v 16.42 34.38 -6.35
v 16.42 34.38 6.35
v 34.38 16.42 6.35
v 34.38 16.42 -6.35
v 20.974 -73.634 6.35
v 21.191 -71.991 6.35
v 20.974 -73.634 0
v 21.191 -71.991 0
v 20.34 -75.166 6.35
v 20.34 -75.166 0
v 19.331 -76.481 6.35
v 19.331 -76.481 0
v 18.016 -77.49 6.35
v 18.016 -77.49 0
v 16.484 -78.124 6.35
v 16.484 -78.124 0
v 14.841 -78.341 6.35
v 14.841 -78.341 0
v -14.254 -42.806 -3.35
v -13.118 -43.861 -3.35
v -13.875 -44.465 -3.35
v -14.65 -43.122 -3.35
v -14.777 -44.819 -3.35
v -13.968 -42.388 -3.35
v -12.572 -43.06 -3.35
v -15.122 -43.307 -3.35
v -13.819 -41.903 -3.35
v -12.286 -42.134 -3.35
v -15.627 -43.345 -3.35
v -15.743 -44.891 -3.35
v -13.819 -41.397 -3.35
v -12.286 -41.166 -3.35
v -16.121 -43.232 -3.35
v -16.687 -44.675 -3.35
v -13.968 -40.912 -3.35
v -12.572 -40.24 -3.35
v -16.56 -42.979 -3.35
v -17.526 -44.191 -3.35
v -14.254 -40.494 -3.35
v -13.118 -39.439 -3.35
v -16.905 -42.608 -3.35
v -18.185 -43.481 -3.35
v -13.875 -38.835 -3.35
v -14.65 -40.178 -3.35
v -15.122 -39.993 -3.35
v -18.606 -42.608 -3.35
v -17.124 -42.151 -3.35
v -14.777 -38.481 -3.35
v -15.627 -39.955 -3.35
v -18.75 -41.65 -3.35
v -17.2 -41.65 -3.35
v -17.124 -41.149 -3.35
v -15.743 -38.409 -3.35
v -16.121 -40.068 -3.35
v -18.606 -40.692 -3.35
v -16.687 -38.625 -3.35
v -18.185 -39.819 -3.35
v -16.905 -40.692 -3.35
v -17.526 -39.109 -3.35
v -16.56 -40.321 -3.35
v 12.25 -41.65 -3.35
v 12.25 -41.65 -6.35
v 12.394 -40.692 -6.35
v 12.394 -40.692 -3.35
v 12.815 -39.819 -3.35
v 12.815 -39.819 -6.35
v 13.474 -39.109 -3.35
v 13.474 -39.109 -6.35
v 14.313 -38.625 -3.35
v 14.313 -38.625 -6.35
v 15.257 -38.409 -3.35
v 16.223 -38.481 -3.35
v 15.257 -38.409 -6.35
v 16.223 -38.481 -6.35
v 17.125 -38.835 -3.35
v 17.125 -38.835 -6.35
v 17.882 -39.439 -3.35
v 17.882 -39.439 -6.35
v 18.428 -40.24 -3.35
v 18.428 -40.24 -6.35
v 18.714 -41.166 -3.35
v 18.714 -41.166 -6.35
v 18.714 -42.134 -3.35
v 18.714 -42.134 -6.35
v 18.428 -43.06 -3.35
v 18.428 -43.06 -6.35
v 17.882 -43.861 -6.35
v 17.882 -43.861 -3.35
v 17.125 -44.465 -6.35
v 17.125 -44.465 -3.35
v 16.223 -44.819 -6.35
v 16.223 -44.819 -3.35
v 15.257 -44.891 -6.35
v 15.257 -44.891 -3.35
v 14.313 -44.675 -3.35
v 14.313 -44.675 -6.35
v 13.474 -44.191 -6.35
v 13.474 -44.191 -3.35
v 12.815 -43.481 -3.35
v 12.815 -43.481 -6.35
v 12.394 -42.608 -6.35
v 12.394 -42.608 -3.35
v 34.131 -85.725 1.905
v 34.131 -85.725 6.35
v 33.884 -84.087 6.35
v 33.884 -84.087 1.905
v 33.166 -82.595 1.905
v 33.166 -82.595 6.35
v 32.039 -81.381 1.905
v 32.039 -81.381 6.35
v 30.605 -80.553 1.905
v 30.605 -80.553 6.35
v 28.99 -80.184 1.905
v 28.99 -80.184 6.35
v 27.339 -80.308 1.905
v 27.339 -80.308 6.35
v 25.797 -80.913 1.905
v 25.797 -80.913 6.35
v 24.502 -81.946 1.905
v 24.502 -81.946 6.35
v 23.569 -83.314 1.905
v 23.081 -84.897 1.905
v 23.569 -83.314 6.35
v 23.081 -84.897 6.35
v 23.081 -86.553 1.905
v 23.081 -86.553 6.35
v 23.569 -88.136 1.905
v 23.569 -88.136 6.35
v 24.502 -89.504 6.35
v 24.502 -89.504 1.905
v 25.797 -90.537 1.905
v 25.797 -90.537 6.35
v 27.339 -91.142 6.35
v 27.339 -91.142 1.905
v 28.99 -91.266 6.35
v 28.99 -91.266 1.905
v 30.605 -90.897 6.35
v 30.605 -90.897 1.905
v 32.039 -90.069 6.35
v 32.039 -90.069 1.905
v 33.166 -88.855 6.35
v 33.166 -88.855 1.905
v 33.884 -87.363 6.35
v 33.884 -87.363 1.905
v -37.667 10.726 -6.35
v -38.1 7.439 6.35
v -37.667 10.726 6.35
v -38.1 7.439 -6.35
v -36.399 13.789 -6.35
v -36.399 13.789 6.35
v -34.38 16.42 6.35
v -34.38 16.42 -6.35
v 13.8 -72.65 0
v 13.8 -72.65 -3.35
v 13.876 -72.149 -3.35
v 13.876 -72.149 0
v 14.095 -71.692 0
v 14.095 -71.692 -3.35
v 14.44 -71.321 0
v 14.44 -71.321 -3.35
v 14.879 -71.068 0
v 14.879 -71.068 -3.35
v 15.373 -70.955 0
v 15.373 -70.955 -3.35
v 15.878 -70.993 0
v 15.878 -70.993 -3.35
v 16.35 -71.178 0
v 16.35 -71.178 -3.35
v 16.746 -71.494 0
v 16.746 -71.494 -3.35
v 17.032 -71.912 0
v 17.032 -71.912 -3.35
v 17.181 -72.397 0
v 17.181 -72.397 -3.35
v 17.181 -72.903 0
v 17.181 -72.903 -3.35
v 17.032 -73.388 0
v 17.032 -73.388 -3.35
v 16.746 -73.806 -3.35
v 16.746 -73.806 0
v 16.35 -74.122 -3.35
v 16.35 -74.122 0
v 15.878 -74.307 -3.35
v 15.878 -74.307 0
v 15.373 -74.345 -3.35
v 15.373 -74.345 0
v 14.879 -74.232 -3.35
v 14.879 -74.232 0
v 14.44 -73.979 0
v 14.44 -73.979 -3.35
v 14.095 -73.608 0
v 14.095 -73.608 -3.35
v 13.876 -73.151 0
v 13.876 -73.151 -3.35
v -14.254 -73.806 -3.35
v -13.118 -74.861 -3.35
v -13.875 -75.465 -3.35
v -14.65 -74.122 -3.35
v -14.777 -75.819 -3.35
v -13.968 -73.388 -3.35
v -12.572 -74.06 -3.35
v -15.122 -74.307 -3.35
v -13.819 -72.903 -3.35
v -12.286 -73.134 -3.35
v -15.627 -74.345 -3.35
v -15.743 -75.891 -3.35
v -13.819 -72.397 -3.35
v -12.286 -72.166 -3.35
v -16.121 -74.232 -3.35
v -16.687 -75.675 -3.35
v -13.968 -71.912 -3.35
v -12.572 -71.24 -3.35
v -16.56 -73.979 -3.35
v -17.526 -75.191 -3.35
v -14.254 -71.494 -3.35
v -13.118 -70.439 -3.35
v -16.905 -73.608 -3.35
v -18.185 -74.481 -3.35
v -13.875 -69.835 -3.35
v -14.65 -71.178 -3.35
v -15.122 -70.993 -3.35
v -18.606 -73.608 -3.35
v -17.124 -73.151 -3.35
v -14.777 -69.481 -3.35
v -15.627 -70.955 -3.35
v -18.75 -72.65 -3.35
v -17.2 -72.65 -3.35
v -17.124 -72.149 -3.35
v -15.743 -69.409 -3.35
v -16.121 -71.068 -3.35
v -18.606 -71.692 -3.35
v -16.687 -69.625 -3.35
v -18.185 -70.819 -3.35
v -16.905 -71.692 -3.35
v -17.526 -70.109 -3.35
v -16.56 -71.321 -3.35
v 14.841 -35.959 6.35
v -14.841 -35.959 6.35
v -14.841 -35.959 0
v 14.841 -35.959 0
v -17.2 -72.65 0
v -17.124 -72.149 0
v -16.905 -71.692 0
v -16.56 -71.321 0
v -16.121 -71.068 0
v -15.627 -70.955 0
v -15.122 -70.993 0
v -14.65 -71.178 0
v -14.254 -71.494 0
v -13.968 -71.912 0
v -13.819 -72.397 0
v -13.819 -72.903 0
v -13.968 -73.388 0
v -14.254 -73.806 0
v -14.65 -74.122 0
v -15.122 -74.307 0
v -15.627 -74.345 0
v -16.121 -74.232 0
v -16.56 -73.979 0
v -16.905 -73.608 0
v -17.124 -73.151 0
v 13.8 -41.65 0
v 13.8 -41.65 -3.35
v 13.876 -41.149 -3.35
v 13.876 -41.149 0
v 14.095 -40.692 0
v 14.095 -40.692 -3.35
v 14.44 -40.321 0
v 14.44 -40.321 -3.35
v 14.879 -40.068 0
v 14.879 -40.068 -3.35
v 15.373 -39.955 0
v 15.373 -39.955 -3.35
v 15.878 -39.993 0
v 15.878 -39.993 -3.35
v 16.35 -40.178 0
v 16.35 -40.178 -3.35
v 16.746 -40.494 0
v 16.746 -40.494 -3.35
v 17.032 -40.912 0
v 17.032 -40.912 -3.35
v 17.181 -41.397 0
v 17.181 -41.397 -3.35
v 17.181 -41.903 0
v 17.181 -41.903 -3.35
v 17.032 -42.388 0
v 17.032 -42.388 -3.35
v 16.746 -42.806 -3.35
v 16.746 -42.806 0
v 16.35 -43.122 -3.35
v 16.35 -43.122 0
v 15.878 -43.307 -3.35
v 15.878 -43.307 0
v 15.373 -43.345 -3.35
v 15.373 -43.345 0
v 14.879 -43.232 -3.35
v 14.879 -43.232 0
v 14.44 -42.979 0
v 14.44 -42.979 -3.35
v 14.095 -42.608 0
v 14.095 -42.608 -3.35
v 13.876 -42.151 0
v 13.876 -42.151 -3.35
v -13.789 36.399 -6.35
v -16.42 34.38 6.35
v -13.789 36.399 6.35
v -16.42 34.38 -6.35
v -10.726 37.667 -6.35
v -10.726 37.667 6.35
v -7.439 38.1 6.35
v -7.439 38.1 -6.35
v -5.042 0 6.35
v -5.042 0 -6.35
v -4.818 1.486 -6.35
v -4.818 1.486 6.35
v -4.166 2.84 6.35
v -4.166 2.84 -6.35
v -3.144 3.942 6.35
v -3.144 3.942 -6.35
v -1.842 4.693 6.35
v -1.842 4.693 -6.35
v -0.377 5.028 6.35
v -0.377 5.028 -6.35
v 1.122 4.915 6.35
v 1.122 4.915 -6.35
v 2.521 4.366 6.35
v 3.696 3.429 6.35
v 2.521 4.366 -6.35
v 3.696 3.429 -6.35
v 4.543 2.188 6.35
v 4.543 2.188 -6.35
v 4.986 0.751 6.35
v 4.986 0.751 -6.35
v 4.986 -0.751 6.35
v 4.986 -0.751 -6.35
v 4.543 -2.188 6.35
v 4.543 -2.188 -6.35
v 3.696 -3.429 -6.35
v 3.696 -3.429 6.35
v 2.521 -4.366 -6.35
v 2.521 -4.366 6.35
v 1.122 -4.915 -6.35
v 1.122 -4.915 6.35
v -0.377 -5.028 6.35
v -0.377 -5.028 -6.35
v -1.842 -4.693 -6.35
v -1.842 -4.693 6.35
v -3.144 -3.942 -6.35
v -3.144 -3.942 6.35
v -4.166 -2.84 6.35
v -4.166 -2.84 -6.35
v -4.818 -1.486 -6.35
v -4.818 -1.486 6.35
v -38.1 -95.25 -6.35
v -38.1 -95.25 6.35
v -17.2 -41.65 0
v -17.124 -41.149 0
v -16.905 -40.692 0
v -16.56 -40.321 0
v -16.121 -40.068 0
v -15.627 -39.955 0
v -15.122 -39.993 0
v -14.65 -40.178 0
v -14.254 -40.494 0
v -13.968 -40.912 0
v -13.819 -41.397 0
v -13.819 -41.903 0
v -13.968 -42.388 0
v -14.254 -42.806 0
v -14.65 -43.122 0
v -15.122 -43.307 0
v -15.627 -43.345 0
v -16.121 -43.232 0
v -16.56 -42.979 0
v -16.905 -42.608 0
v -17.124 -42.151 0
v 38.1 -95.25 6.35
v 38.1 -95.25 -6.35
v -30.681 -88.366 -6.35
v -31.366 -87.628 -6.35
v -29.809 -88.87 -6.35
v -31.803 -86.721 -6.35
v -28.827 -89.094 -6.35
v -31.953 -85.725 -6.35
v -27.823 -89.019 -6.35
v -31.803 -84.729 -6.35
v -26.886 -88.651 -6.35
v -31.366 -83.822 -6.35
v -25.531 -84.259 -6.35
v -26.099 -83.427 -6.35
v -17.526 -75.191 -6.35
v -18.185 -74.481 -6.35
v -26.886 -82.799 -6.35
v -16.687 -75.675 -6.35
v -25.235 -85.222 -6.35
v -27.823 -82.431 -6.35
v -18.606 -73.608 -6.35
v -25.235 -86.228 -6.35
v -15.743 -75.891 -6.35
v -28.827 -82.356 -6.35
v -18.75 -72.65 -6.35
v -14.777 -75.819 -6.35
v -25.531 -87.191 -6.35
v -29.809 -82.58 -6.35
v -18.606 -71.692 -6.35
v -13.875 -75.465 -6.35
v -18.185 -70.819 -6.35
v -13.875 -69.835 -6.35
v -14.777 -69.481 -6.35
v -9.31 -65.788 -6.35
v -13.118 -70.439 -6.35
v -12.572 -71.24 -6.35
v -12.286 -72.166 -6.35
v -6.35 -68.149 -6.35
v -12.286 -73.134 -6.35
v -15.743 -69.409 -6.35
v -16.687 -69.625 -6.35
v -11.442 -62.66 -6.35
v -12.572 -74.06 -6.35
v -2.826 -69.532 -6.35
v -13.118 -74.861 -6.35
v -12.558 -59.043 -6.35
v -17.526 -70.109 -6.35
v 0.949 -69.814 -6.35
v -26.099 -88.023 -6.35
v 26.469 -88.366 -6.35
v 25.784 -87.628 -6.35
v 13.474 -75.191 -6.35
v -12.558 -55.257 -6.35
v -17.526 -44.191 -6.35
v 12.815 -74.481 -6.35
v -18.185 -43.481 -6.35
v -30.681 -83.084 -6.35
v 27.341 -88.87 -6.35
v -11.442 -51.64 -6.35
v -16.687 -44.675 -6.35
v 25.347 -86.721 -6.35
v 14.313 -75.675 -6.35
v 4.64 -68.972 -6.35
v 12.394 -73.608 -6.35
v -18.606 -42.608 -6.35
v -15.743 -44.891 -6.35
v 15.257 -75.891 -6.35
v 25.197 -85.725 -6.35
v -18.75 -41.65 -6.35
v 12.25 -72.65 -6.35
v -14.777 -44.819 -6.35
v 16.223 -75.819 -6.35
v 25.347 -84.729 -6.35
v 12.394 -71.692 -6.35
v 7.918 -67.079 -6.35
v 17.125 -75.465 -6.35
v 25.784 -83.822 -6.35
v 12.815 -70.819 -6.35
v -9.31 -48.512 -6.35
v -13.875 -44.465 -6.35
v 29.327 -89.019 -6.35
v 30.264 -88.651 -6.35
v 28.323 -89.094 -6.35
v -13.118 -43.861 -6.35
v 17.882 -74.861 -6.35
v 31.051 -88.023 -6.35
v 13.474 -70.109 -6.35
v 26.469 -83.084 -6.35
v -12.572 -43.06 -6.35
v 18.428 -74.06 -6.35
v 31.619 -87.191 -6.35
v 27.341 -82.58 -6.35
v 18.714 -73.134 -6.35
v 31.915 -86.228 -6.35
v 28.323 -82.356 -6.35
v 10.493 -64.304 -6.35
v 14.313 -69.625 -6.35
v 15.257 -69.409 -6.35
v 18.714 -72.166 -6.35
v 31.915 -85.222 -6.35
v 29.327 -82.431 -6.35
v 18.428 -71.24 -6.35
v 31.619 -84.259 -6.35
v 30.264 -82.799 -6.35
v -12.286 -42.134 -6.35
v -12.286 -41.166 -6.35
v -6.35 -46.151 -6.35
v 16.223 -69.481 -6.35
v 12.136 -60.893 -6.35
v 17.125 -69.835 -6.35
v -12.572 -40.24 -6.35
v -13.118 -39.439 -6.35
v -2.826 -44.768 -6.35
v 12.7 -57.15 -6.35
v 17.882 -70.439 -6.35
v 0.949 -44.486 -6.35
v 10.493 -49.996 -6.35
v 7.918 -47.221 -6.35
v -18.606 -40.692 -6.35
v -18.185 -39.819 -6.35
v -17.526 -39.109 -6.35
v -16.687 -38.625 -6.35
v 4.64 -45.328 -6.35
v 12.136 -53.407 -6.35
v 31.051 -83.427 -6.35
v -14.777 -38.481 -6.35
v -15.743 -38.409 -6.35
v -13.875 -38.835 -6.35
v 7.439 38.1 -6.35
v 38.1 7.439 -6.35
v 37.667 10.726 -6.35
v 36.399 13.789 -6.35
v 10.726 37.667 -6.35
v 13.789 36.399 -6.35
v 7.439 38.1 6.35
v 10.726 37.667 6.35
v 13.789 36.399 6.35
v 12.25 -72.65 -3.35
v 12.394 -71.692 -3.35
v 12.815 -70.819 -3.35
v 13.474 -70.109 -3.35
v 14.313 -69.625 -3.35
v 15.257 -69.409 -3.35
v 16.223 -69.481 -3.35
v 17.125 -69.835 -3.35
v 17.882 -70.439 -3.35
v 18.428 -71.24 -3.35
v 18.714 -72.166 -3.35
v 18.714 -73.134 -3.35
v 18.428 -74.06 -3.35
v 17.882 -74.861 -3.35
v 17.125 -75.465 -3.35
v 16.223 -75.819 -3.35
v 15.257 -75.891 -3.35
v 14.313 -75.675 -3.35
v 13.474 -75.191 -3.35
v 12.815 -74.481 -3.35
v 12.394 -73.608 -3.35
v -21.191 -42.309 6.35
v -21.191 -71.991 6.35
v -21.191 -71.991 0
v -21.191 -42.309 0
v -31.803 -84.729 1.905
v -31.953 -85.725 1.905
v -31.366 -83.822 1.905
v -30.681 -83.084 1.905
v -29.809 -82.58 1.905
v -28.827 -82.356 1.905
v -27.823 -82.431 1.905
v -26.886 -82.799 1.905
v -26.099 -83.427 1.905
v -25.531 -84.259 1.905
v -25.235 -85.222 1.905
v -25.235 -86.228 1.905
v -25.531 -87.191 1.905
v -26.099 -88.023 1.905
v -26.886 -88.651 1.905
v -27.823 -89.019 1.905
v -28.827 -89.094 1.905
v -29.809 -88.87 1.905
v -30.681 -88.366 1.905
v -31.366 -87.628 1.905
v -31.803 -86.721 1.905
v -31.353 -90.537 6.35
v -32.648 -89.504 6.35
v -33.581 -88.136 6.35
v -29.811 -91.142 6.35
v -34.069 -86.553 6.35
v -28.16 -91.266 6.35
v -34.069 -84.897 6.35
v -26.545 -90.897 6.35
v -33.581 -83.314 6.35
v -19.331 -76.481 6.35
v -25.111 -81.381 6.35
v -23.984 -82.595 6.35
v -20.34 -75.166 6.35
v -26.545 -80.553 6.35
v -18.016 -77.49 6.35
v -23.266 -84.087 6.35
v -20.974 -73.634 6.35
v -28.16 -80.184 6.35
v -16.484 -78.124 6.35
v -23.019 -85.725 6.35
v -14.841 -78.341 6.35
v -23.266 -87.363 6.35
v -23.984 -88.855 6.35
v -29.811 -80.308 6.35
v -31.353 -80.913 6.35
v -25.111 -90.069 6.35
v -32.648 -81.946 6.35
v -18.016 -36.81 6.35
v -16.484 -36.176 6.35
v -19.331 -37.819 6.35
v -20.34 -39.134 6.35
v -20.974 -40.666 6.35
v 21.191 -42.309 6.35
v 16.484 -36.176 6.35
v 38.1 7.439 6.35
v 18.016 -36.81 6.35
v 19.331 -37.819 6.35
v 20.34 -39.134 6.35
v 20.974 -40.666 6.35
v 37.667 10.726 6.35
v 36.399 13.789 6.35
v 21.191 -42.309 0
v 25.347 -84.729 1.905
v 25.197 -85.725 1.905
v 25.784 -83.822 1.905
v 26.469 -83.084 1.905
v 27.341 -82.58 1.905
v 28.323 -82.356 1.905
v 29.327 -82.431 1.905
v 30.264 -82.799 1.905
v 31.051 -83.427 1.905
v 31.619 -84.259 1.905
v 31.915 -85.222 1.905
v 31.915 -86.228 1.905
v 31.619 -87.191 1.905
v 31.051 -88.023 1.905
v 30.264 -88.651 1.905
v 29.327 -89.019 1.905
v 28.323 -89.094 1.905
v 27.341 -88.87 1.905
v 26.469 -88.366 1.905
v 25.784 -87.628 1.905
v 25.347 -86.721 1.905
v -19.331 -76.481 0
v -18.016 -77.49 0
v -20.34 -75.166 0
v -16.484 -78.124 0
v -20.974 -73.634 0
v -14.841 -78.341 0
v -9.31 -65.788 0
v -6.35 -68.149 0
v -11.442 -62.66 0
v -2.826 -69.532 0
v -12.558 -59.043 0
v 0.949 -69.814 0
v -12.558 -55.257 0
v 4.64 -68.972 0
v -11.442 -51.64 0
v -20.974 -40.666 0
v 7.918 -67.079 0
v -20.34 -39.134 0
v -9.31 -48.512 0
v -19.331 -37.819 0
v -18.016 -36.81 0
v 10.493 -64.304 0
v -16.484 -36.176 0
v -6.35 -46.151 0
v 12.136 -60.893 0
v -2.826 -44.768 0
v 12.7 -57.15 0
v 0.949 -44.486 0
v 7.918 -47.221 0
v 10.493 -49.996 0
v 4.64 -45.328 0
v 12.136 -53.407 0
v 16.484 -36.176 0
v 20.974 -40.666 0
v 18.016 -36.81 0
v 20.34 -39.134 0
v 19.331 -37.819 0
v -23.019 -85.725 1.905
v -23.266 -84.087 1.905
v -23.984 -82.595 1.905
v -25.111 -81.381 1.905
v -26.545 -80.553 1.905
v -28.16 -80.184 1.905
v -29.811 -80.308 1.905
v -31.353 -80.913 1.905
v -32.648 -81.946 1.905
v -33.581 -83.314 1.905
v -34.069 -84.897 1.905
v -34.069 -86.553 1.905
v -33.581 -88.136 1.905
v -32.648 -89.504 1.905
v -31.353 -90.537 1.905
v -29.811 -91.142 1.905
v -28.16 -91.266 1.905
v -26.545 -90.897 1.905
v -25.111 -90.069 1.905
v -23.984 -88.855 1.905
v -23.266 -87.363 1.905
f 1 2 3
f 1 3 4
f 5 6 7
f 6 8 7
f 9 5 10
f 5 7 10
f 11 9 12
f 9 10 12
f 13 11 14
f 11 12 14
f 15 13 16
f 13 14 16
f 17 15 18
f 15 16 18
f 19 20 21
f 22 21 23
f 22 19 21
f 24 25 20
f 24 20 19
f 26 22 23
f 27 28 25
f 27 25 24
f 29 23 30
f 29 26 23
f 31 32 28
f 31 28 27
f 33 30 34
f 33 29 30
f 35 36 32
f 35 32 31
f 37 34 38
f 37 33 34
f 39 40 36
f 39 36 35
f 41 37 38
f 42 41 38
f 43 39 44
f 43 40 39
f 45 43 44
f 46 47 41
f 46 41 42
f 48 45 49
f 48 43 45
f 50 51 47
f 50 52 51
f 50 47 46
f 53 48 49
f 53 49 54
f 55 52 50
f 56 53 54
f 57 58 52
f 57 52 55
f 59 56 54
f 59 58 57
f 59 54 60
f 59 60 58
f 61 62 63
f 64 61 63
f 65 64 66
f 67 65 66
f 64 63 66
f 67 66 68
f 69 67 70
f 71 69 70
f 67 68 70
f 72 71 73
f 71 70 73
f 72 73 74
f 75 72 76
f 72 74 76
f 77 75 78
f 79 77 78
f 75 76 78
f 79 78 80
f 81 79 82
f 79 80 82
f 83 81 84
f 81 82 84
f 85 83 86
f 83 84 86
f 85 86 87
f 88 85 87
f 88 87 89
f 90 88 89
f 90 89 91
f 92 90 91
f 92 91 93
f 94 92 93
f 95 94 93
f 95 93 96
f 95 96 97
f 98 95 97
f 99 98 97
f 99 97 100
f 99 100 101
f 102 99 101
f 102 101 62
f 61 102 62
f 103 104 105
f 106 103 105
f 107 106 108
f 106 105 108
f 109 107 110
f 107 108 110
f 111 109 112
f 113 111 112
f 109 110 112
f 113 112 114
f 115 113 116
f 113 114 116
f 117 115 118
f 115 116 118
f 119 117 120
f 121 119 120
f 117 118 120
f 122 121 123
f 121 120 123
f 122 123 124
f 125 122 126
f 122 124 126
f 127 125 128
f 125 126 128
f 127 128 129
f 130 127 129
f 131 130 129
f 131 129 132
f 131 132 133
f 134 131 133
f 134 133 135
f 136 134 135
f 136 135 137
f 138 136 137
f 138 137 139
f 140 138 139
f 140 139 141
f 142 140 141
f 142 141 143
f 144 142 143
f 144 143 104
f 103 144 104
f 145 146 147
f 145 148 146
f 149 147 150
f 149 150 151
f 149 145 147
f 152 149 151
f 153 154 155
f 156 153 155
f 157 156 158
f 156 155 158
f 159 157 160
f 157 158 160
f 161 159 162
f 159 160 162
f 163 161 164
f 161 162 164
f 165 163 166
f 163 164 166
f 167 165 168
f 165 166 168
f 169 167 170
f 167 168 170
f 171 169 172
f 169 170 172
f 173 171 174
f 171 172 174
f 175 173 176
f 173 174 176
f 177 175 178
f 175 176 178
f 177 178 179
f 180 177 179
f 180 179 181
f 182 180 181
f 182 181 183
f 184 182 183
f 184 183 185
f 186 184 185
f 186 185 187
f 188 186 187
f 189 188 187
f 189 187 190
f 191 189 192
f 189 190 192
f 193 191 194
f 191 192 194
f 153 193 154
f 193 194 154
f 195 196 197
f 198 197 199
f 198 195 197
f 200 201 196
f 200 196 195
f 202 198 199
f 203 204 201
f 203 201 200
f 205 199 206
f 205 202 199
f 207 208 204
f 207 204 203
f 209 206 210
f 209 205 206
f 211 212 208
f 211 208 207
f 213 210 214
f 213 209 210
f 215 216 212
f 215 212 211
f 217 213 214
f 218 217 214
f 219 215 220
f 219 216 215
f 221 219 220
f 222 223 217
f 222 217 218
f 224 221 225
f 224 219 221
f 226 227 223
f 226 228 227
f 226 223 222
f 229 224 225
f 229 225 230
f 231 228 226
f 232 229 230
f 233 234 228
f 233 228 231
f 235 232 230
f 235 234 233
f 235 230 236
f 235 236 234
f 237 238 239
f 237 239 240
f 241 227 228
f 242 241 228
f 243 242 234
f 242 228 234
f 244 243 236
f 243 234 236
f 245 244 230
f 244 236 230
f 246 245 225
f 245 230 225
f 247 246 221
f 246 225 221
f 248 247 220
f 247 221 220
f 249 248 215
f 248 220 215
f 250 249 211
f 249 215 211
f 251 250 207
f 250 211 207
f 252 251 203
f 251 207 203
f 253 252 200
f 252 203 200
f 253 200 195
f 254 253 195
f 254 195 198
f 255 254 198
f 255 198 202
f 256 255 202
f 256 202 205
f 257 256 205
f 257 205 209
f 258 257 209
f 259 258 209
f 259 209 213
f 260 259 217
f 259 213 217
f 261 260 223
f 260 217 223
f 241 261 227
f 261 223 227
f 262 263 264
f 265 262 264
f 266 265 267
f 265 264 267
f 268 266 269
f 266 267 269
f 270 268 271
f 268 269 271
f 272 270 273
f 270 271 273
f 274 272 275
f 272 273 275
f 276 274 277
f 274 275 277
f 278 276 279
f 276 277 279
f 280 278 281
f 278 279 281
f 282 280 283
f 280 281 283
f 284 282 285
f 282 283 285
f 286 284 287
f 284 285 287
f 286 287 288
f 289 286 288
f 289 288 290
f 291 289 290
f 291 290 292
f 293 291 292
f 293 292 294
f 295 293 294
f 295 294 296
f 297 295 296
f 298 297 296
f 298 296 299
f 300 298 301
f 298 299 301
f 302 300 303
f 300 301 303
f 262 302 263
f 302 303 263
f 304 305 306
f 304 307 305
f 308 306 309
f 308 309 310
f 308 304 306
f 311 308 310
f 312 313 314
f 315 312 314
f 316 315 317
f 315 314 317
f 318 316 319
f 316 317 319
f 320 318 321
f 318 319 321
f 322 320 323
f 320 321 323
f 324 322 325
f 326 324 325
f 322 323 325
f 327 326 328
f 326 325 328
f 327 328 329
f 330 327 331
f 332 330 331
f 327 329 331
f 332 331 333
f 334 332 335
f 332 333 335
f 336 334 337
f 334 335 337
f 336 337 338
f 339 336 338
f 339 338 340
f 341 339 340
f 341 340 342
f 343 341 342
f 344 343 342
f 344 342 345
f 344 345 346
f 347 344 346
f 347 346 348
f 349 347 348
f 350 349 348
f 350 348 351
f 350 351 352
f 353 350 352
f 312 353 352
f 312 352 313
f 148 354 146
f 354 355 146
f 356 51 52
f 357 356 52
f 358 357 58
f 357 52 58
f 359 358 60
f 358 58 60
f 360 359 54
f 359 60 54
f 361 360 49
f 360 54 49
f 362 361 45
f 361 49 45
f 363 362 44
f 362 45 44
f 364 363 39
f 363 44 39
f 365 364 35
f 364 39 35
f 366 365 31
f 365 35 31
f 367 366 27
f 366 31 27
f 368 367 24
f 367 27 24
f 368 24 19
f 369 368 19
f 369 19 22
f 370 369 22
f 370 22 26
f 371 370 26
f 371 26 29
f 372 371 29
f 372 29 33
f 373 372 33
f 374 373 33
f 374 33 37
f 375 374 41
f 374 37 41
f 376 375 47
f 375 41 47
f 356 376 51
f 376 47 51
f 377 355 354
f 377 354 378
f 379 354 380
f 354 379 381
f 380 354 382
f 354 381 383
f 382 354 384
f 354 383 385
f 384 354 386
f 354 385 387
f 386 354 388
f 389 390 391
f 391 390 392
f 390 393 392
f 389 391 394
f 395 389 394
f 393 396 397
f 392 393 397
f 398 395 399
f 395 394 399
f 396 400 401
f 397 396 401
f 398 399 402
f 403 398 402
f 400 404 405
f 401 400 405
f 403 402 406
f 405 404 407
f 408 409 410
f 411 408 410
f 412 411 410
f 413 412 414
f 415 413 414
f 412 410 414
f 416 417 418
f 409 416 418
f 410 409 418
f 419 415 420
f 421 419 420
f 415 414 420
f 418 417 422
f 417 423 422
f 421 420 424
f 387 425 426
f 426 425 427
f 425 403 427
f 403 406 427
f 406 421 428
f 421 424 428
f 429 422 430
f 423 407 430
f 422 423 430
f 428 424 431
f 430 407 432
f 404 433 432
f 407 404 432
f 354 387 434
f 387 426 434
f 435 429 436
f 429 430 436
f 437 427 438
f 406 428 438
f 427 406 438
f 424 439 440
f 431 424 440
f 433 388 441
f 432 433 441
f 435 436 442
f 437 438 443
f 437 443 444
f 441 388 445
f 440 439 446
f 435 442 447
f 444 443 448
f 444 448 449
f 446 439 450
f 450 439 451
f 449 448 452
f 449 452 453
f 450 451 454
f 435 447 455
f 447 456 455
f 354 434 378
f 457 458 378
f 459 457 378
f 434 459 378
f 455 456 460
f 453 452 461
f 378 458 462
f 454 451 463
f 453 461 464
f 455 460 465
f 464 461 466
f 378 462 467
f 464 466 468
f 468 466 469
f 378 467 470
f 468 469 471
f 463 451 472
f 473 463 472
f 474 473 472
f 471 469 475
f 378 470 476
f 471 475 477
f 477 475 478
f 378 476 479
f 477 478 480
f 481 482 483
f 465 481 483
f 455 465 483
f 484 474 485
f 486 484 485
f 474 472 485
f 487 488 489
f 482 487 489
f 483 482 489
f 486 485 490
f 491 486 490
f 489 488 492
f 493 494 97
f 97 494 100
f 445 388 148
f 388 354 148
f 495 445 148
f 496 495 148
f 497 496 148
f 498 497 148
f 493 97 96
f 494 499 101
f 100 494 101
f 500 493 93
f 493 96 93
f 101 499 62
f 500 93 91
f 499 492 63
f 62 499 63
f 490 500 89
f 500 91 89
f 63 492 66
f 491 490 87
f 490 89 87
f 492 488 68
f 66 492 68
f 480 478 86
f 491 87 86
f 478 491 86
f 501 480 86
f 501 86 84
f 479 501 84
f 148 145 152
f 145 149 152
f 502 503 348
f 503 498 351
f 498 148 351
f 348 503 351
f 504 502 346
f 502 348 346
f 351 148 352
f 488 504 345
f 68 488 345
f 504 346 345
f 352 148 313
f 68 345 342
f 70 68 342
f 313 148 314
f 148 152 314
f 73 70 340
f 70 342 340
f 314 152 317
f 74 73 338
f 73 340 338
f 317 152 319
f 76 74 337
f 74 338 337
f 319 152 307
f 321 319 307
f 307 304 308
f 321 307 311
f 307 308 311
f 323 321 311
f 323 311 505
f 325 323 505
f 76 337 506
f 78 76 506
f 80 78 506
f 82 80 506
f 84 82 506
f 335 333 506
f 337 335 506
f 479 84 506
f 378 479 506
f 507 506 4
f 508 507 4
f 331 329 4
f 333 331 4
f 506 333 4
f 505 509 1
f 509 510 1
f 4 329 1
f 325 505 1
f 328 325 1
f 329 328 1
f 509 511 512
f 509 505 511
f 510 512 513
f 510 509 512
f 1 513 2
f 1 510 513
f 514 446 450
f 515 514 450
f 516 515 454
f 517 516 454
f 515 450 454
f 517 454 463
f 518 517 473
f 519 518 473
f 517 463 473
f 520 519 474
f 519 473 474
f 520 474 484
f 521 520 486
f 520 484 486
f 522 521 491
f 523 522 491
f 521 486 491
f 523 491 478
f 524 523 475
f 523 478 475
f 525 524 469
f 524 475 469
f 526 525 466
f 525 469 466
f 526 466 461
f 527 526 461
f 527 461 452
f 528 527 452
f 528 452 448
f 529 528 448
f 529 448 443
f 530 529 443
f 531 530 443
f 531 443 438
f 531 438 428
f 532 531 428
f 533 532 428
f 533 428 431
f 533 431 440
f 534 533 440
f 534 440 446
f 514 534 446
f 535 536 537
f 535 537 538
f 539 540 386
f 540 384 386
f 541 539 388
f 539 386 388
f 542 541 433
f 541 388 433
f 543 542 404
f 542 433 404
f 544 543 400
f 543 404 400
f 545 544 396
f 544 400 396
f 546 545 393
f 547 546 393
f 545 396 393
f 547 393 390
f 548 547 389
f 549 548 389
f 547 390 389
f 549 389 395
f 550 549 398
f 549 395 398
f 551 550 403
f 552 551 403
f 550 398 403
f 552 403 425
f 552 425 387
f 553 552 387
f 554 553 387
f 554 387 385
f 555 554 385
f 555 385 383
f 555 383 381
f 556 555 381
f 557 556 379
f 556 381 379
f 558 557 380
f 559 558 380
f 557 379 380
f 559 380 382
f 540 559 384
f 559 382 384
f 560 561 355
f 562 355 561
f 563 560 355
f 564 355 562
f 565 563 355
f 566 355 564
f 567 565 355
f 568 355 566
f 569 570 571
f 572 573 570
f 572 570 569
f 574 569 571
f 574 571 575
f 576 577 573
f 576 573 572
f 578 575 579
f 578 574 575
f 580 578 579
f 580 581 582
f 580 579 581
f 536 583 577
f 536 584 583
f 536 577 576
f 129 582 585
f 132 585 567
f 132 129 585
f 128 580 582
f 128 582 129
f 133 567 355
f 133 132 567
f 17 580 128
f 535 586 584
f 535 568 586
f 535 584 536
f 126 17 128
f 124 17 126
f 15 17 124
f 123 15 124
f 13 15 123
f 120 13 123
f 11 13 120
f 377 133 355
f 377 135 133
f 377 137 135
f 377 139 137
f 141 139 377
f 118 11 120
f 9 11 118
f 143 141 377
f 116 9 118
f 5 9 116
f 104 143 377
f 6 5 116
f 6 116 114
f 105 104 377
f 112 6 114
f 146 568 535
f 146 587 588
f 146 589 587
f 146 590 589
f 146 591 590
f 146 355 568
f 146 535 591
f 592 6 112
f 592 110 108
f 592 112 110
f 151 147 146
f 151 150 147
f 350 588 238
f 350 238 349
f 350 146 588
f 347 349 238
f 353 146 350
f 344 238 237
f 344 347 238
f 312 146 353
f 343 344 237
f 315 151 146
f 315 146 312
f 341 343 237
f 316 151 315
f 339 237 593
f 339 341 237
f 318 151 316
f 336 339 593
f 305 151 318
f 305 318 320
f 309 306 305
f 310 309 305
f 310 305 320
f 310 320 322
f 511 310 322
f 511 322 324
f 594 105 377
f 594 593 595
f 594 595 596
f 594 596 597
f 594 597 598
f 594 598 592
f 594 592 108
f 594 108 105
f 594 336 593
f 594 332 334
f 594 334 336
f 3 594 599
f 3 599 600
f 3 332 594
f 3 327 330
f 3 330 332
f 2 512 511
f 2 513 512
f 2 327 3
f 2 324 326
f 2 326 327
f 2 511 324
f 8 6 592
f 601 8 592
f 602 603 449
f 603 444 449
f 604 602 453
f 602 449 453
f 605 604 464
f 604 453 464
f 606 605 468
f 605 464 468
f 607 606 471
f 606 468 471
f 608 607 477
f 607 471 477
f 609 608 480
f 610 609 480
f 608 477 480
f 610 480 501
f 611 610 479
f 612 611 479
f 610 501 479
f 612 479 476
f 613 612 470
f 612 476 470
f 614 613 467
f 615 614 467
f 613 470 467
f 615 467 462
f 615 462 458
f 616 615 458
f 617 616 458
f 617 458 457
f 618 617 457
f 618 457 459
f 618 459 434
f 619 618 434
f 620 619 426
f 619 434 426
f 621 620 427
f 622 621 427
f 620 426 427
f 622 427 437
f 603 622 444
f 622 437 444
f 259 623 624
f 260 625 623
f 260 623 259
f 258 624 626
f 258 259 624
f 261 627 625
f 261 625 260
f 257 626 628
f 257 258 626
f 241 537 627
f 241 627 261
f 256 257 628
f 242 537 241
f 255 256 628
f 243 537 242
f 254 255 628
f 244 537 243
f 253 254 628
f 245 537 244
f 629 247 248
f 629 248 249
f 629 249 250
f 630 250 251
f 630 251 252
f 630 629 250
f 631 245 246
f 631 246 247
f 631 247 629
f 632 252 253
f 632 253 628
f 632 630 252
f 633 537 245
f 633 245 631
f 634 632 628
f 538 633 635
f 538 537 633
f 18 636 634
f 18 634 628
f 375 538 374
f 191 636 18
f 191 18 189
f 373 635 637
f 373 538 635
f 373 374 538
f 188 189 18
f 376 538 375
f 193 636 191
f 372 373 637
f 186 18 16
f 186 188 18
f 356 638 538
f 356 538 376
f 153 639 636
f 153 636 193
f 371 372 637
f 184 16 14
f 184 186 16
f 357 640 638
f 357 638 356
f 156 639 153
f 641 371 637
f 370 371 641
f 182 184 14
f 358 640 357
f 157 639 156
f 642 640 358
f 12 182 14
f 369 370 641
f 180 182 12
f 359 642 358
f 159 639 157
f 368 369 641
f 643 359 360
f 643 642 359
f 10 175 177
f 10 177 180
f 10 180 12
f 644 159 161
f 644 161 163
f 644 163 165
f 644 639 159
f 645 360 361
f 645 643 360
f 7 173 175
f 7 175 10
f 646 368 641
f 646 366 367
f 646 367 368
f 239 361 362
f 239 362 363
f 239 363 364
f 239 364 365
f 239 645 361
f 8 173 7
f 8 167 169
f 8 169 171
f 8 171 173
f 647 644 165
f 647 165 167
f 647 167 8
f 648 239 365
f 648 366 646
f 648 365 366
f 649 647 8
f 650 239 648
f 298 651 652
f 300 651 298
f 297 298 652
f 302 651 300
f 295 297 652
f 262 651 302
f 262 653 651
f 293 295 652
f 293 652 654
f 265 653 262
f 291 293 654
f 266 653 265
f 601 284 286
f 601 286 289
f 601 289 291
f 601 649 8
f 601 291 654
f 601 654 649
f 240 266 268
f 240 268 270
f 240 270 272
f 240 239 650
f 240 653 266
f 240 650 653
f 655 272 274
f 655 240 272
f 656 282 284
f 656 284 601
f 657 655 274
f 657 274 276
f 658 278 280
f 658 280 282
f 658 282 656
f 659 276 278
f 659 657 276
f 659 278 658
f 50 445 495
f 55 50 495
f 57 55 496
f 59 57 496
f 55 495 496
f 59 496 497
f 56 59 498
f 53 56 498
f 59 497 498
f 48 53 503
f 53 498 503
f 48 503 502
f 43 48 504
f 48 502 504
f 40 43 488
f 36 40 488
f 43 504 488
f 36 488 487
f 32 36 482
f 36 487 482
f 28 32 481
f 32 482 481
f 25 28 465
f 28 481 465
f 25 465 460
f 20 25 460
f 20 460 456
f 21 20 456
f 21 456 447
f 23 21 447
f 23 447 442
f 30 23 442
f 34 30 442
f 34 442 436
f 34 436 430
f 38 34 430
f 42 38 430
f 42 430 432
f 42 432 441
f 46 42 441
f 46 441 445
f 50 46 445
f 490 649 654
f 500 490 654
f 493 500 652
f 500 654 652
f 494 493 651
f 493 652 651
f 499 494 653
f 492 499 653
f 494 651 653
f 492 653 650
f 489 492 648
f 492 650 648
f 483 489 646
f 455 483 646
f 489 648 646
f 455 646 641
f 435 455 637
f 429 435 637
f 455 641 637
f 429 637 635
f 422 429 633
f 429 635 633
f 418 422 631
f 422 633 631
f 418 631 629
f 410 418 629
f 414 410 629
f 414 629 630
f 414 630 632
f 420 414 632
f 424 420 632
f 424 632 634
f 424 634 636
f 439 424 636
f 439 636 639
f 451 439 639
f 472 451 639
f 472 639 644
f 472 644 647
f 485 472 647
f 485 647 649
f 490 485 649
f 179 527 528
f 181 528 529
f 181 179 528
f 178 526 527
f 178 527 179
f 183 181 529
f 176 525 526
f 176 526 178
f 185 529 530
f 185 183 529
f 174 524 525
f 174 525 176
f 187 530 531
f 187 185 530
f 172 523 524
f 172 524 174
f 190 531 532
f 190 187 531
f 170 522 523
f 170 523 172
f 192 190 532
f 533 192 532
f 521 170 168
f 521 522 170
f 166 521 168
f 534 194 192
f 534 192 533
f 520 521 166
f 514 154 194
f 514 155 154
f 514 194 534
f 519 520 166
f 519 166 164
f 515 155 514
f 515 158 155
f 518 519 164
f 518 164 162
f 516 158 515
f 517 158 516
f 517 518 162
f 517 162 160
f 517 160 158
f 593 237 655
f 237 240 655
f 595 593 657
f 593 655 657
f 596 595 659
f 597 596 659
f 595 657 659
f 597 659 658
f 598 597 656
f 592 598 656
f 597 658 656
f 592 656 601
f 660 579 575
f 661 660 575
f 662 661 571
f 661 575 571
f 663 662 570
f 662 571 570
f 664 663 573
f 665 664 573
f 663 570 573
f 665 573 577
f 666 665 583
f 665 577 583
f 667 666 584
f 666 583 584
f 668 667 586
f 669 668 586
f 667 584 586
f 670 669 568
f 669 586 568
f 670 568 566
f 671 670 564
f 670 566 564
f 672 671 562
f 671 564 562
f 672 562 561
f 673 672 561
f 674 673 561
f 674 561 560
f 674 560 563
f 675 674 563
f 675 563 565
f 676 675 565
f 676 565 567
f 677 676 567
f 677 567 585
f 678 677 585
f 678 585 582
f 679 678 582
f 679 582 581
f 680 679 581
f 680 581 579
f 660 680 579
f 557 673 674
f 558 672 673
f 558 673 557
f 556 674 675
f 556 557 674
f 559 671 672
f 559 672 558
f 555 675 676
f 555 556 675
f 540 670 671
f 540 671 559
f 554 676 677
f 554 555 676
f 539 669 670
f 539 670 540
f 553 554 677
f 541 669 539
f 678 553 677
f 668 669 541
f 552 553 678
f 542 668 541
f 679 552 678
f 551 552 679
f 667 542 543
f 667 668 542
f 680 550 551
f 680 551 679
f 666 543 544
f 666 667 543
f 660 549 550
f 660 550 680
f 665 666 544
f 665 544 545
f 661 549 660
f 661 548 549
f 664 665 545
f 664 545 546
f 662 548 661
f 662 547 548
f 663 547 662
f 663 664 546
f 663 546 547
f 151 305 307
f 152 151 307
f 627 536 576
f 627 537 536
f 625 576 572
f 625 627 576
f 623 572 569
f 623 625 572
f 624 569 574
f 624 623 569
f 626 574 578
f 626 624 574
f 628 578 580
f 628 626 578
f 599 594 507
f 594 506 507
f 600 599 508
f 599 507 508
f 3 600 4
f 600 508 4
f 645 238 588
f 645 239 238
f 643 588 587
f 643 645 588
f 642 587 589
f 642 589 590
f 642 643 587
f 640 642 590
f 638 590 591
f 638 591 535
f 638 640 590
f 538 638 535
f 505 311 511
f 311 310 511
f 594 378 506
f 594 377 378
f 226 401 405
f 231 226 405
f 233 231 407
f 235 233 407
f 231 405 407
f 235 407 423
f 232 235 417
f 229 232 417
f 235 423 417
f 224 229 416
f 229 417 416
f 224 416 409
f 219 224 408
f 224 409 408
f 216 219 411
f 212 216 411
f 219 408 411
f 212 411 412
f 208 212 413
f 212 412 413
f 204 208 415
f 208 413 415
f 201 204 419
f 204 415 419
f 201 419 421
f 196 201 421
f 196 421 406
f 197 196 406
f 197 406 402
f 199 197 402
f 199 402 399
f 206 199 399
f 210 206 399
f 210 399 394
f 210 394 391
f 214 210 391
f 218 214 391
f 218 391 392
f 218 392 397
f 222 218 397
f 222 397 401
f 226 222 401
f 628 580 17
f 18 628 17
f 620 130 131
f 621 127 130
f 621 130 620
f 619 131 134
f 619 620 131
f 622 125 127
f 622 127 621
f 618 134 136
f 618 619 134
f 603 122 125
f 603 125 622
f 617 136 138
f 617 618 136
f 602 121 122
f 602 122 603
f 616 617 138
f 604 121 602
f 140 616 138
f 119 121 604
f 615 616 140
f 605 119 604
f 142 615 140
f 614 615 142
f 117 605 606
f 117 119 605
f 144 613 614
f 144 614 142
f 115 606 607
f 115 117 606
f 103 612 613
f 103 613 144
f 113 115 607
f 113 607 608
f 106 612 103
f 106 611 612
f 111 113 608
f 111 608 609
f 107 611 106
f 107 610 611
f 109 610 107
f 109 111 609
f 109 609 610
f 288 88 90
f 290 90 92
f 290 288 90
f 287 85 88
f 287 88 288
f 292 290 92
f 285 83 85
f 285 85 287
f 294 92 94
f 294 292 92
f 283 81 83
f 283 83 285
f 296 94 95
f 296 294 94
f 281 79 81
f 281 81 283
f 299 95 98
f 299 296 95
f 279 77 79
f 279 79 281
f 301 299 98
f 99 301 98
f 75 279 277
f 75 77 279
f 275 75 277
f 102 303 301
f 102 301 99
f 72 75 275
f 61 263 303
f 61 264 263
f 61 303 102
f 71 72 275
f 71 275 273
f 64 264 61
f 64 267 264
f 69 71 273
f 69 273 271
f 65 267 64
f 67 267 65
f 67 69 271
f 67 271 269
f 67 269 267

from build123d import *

# Parameters (mm, degrees)
SKETCH2_W                                        = 76.2
SKETCH2_H                                        = 133.35
BOSS_EXTRUDE1_DEPTH                              = 6.35
F_3_8_CLEARANCE_HOLE1_D                          = 10.0838
M3_CLEARANCE_HOLE1_D                             = 3.4
SKETCH13_R                                       = 12.7
CUT_EXTRUDE2_DEPTH                               = 13.7
SKETCH14_W                                       = 42.381000074
SKETCH14_H                                       = 42.381000074
CUT_EXTRUDE3_DEPTH                               = 6.35
CHAMFER1_SIZE                                    = 25.4
CBORE_FOR_1_4_SOCKET_HEAD_CAP_SCREW1_D           = 6.7564
CBORE_FOR_1_4_SOCKET_HEAD_CAP_SCREW1_CBORE_D     = 11.1125
CBORE_FOR_1_4_SOCKET_HEAD_CAP_SCREW1_CBORE_DEPTH = 4.445
CBORE_FOR_M3_SHCS1_D                             = 3.4
CBORE_FOR_M3_SHCS1_CBORE_D                       = 6.5
CBORE_FOR_M3_SHCS1_CBORE_DEPTH                   = 3
FILLET1_R                                        = 6.35
FILLET2_R                                        = 12.7


with BuildPart() as part:
    # Sketch2 → Boss-Extrude1 (new body, symmetric)
    with BuildSketch(Plane.XY):
        with Locations((0, -28.575)):
            Rectangle(SKETCH2_W, SKETCH2_H)
    extrude(amount=BOSS_EXTRUDE1_DEPTH, both=True)

    # 3/8 Clearance Hole1 (through all)
    with Locations(Plane.XY.offset(6.35)):
        with Locations((0, 0)):
            Hole(F_3_8_CLEARANCE_HOLE1_D / 2)

    # M3 Clearance Hole1 (through all)
    with Locations(Plane.XY.offset(6.35)):
        with Locations((-15.5, -41.65), (15.5, -41.65), (15.5, -72.65), (-15.5, -72.65)):
            Hole(M3_CLEARANCE_HOLE1_D / 2)

    # Sketch13 → Cut-Extrude2 (cut, through all)
    with BuildSketch(Plane.XY.offset(6.35)):
        with Locations((0, -57.15)):
            Circle(SKETCH13_R)
    extrude(amount=-CUT_EXTRUDE2_DEPTH, mode=Mode.SUBTRACT)

    # Sketch14 → Cut-Extrude3 (cut)
    with BuildSketch(Plane.XY.offset(6.35)):
        with Locations((0, -57.15)):
            Rectangle(SKETCH14_W, SKETCH14_H)
    extrude(amount=-CUT_EXTRUDE3_DEPTH, mode=Mode.SUBTRACT)

    # Chamfer1
    chamfer1_edges = [part.edges().sort_by_distance(p)[0] for p in [
        (-38.1, 38.1, 0),
        (38.1, 38.1, 0),
    ]]
    chamfer(chamfer1_edges, length=CHAMFER1_SIZE)

    # CBORE for 1/4 Socket Head Cap Screw1 (through all)
    with Locations(Plane.XY.offset(6.35)):
        with Locations((-28.575, -85.725), (28.575, -85.725)):
            CounterBoreHole(CBORE_FOR_1_4_SOCKET_HEAD_CAP_SCREW1_D / 2, CBORE_FOR_1_4_SOCKET_HEAD_CAP_SCREW1_CBORE_D / 2, CBORE_FOR_1_4_SOCKET_HEAD_CAP_SCREW1_CBORE_DEPTH)

    # CBORE for M3 SHCS1 (through all)
    with Locations(Plane(origin=(0, 0, -6.35), x_dir=(-1, 0, 0), z_dir=(0, 0, -1))):
        with Locations((-15.5, -41.65), (15.5, -41.65), (15.5, -72.65), (-15.5, -72.65)):
            CounterBoreHole(CBORE_FOR_M3_SHCS1_D / 2, CBORE_FOR_M3_SHCS1_CBORE_D / 2, CBORE_FOR_M3_SHCS1_CBORE_DEPTH)

    # Fillet1
    fillet1_edges = [part.edges().sort_by_distance(p)[0] for p in [
        (-21.190500037, -35.959499963, 3.175),
        (-21.190500037, -78.340500037, 3.175),
        (21.190500037, -78.340500037, 3.175),
        (21.190500037, -35.959499963, 3.175),
    ]]
    fillet(fillet1_edges, radius=FILLET1_R)

    # Fillet2
    fillet2_edges = [part.edges().sort_by_distance(p)[0] for p in [
        (-12.7, 38.1, 0),
        (12.7, 38.1, 0),
        (38.1, 12.7, 0),
        (-38.1, 12.7, 0),
    ]]
    fillet(fillet2_edges, radius=FILLET2_R)


solid = part.part
